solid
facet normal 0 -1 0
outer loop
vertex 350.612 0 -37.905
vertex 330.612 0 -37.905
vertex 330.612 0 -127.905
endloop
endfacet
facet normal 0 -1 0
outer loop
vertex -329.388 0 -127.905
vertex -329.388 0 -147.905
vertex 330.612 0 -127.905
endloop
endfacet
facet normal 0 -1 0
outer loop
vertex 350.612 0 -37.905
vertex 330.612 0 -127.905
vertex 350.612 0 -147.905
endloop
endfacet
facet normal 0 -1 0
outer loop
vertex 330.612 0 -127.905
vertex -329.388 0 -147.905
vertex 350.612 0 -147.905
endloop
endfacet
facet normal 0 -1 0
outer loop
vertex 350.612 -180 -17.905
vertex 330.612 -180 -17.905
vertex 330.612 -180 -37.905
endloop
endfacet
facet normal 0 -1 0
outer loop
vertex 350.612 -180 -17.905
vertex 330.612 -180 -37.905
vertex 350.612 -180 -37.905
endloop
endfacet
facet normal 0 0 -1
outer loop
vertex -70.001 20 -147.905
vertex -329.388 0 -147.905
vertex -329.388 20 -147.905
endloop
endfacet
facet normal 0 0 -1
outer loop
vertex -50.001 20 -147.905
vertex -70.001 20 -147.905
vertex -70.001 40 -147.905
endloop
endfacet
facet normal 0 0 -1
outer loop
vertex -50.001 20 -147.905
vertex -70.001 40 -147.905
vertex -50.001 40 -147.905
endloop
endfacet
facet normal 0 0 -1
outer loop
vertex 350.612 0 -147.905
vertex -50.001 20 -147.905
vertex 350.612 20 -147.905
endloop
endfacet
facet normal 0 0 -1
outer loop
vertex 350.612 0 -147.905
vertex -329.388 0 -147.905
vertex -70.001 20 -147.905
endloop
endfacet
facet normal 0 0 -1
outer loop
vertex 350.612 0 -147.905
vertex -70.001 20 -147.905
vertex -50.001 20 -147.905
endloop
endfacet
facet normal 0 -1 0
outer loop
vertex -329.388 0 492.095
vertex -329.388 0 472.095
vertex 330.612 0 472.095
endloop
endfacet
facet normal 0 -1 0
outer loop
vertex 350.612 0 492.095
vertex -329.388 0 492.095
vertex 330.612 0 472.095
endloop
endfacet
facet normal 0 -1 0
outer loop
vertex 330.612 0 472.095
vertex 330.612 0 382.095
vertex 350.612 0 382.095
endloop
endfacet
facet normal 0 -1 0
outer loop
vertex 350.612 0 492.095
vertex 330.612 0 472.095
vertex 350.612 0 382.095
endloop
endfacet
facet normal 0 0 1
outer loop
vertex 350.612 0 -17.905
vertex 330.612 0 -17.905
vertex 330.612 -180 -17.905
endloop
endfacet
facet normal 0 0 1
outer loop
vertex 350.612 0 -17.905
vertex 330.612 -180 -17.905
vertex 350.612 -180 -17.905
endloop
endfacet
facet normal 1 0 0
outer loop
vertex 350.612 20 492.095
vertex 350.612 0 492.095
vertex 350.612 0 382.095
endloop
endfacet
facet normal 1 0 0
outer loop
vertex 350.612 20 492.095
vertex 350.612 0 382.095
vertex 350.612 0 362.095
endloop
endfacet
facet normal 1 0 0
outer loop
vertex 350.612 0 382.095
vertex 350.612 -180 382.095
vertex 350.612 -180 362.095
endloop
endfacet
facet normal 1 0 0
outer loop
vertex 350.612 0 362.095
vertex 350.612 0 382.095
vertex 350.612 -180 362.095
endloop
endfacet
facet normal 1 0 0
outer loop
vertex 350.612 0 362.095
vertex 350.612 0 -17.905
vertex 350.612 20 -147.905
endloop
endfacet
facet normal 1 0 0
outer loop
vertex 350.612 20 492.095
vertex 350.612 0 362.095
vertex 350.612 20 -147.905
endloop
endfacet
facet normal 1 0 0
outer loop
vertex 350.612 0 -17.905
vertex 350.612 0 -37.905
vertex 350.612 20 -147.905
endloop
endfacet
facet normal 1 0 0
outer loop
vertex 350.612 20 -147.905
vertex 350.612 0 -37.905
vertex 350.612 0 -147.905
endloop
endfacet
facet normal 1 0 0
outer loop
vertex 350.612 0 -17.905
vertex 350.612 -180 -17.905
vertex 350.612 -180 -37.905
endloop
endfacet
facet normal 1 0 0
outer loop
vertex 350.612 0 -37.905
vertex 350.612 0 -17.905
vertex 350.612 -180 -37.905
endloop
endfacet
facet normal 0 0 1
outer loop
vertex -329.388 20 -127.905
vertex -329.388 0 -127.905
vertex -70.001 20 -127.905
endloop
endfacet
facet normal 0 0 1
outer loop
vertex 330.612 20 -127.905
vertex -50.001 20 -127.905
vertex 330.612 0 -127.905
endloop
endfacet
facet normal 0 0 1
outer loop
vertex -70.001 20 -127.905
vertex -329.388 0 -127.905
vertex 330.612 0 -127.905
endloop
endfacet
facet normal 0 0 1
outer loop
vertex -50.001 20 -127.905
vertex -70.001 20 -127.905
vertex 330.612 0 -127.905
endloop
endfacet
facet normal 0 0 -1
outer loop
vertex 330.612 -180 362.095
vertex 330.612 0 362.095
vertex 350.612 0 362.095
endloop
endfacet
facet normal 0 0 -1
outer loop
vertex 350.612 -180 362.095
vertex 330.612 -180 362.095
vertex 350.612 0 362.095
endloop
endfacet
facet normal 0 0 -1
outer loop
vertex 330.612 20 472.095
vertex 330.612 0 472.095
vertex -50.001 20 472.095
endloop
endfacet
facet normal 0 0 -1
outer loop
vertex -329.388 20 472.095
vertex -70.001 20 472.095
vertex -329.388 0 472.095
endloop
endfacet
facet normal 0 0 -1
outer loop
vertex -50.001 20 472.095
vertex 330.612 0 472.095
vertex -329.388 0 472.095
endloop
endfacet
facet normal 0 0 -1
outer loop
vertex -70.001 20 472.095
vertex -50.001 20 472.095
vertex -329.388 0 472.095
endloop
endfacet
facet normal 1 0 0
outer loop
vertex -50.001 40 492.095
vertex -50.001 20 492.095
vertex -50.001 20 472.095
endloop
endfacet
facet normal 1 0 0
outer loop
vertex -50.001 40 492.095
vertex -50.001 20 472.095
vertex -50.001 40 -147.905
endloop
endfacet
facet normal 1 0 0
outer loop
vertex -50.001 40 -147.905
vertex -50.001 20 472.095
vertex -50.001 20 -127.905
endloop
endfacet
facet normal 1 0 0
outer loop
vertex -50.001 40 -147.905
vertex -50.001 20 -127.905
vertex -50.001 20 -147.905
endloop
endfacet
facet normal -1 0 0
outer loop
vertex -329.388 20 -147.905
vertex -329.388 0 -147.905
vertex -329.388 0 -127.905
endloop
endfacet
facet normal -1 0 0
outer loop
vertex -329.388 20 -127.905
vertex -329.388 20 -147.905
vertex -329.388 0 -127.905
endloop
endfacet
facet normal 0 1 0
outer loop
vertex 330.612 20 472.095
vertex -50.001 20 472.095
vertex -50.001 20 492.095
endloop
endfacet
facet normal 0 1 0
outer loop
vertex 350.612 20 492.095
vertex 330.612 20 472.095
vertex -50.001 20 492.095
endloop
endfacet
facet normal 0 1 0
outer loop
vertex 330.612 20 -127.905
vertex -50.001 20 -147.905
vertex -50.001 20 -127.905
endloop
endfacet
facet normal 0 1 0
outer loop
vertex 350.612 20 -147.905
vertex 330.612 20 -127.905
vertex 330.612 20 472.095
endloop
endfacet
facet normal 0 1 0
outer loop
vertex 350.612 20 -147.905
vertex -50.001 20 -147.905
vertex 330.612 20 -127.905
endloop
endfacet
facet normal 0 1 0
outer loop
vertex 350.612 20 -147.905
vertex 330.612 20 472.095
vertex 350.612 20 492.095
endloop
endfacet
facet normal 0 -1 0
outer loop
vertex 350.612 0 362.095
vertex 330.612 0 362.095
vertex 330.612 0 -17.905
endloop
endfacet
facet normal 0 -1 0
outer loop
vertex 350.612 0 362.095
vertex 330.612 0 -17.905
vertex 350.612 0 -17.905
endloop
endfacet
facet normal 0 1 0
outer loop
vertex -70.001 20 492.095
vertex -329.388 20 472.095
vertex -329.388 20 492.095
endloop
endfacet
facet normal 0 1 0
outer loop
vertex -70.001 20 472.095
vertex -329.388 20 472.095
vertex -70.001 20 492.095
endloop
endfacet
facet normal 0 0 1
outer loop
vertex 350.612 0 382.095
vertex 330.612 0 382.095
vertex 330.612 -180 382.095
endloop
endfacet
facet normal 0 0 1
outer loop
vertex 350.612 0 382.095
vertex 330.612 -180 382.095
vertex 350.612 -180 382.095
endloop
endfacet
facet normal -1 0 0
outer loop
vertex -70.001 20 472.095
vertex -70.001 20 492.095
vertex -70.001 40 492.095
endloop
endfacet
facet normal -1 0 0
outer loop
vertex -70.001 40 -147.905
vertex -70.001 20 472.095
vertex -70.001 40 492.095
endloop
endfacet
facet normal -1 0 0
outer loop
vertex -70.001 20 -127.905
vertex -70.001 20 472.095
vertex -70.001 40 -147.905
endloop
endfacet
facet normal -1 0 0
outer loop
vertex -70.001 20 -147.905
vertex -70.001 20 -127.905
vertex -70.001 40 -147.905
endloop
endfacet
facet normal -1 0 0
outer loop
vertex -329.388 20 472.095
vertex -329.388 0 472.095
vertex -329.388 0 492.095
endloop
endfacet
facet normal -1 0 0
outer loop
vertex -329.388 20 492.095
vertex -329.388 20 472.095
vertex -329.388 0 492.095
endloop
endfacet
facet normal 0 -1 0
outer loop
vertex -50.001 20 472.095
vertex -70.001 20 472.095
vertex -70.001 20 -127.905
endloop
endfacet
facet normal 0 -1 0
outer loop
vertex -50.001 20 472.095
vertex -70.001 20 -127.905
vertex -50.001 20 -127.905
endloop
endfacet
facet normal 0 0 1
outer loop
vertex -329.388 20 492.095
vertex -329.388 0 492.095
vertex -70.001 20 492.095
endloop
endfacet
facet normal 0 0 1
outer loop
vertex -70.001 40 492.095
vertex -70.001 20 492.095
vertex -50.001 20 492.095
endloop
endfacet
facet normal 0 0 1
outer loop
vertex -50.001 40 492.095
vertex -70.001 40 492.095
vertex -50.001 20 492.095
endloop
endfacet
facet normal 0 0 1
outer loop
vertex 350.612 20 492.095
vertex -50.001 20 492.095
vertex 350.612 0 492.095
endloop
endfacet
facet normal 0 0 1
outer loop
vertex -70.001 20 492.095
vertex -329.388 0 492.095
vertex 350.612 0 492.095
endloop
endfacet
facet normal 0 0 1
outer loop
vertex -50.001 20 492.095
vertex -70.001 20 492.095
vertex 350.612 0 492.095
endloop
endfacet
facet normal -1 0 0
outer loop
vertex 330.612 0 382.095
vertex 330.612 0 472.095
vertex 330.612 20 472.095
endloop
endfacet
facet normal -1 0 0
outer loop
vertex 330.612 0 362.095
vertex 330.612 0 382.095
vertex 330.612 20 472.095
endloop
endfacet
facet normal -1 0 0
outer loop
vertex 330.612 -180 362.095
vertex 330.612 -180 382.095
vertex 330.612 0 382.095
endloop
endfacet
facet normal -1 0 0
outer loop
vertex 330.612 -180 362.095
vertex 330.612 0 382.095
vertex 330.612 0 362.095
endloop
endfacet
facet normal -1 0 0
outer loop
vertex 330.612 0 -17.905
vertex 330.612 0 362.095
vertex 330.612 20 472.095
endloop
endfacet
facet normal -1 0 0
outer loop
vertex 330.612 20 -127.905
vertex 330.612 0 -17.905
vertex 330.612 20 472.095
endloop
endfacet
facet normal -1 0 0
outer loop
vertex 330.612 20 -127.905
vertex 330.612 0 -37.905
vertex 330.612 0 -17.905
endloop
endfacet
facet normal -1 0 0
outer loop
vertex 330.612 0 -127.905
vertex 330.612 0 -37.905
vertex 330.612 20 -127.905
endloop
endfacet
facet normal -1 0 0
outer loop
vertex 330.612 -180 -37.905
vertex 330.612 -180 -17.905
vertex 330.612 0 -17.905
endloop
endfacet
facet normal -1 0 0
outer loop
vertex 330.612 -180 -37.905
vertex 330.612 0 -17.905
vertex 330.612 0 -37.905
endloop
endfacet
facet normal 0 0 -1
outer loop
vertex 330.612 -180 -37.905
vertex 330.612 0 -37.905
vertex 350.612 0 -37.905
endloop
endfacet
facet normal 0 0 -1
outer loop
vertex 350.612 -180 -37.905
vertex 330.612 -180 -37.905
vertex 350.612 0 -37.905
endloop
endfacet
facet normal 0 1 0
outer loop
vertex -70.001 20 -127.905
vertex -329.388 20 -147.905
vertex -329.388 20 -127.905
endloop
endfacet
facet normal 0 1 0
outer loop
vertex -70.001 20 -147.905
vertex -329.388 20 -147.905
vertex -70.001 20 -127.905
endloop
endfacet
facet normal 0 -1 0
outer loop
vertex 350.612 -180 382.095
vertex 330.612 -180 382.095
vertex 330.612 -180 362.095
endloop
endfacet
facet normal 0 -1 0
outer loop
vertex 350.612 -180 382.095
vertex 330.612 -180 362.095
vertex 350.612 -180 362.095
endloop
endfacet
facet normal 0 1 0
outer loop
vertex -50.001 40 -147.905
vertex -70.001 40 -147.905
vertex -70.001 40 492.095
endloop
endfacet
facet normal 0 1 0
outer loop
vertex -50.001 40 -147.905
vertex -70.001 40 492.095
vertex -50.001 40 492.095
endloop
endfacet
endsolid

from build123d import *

# Parameters (mm, degrees)
SKETCH_1_W          = 380.612698372
SKETCH_1_H          = 600
EXTRUDE_1_DEPTH     = 20
SKETCH1_W           = 20
SKETCH1_H           = 640
BOSS_EXTRUDE1_DEPTH = 20
SKETCH2_W           = 20
SKETCH2_H           = 600
CUT_EXTRUDE1_DEPTH  = 20
SKETCH3_W           = 20
SKETCH3_H           = 20
BOSS_EXTRUDE2_DEPTH = 180


with BuildPart() as part:
    # 草图1 → 凸台-拉伸1 (new body)
    with BuildSketch(Plane(origin=(0, 0, 0), x_dir=(1, 0, 0), z_dir=(0, 1, 0))):
        Polygon((-329.38787024, -472.094950635), (-329.38787024, -492.094950635), (350.61212976, -492.094950635), (350.61212976, 147.905049365), (-329.38787024, 147.905049365), (-329.38787024, 127.905049365), (-70.000568612, 127.905049365), (-70.000568612, -472.094950635), align=None)
        with Locations((140.305780574, -172.094950635)):
            Rectangle(SKETCH_1_W, SKETCH_1_H, mode=Mode.SUBTRACT)
    extrude(amount=EXTRUDE_1_DEPTH)

    # Sketch1 → Boss-Extrude1 (add)
    with BuildSketch(Plane(origin=(0, 20, 0), x_dir=(1, 0, 0), z_dir=(0, 1, 0))):
        with Locations((-60.000568612, -172.094950635)):
            Rectangle(SKETCH1_W, SKETCH1_H)
    extrude(amount=BOSS_EXTRUDE1_DEPTH)

    # Sketch2 → Cut-Extrude1 (cut)
    with BuildSketch(Plane.XZ):
        with Locations((-60.000568612, 172.094950635)):
            Rectangle(SKETCH2_W, SKETCH2_H)
    extrude(amount=-CUT_EXTRUDE1_DEPTH, mode=Mode.SUBTRACT)

    # Sketch3 → Boss-Extrude2 (add)
    with BuildSketch(Plane.XZ):
        with Locations((340.61212976, 372.094950635)):
            Rectangle(SKETCH3_W, SKETCH3_H)
        with Locations((340.61212976, -27.905049365)):
            Rectangle(SKETCH3_W, SKETCH3_H)
    extrude(amount=BOSS_EXTRUDE2_DEPTH)


solid = part.part
